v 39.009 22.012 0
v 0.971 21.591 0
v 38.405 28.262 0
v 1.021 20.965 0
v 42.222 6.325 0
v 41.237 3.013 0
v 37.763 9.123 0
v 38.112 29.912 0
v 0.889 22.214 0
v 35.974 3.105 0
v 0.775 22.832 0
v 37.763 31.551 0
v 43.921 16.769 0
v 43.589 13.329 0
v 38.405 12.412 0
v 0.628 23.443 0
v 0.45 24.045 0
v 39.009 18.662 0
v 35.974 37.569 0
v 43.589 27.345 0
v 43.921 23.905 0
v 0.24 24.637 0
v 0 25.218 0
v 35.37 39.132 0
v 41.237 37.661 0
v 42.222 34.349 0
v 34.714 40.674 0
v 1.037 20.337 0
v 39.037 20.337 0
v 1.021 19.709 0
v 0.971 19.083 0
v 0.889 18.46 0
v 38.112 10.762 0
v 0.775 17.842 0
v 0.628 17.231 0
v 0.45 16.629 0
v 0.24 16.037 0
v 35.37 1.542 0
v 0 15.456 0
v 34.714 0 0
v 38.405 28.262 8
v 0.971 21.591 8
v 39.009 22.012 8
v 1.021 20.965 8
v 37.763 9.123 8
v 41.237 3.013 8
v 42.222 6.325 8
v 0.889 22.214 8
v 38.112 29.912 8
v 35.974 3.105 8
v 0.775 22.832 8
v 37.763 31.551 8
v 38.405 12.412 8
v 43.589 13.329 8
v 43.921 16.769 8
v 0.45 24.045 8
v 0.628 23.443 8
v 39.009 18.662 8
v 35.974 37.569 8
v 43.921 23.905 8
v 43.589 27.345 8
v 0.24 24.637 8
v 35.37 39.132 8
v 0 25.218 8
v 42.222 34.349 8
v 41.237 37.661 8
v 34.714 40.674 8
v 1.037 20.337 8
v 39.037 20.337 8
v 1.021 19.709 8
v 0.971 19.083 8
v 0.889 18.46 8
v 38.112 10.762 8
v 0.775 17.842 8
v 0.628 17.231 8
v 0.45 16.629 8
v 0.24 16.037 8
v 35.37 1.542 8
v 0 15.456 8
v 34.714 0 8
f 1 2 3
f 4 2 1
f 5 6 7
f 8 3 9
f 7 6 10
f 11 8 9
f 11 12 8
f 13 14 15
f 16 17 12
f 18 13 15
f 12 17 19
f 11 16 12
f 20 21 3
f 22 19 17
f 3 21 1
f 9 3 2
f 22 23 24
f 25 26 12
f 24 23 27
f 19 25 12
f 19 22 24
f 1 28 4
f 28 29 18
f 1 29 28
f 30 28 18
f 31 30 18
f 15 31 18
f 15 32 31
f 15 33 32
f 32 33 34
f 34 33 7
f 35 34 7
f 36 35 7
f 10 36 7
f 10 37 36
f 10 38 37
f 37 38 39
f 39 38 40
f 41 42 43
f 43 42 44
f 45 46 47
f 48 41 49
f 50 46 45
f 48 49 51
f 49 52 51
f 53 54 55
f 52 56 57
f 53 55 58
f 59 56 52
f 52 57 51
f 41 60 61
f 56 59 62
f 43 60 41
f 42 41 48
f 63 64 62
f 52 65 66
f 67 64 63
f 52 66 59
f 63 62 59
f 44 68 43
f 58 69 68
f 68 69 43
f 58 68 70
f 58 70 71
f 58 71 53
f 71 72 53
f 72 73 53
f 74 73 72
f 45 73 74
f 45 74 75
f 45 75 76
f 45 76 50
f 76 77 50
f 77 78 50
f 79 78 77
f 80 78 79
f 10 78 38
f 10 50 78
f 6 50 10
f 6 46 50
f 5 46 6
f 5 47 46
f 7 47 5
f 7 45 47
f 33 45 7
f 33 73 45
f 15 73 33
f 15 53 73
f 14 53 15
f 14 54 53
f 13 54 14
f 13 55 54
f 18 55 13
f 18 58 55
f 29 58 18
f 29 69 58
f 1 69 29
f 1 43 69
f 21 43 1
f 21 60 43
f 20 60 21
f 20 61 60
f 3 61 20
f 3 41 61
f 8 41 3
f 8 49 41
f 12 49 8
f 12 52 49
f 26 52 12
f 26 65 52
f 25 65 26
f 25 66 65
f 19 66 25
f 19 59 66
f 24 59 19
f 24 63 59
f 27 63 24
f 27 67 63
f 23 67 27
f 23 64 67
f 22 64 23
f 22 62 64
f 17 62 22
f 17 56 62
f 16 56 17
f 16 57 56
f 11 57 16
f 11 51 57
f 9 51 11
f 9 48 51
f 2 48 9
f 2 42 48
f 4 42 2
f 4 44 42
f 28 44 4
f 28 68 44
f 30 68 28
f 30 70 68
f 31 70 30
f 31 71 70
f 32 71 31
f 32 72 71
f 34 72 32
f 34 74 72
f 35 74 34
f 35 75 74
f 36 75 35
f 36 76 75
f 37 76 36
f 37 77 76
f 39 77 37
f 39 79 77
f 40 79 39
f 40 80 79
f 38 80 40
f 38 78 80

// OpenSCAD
$fn = 32;

// ----------------------------------------------------------------------
// Gear sector: 4 teeth on 48 degrees
// ----------------------------------------------------------------------

// --- parameters (mm) ---
sector_angle = 48;        // sector angle, degrees
root_r = 50;              // root circle radius
tooth_h = 5;              // tooth height over the root circle
teeth = 4;                // number of teeth on the sector
hub_r = 12;               // hub bore radius
plate_t = 8;              // sector thickness, Z
arc_step = 3;             // sampling step of the root/hub arcs, degrees

tip_r = root_r + tooth_h;  // tip circle radius

profile = [[34.714, 0], [35.37, 1.542], [35.974, 3.105], [41.237, 3.013], [42.222, 6.325], [37.763, 9.123], [38.112, 10.762], [38.405, 12.412], [43.589, 13.329], [43.921, 16.769], [39.009, 18.662], [39.037, 20.337], [39.009, 22.012], [43.921, 23.905], [43.589, 27.345], [38.405, 28.262], [38.112, 29.912], [37.763, 31.551], [42.222, 34.349], [41.237, 37.661], [35.974, 37.569], [35.37, 39.132], [34.714, 40.674], [0, 25.218], [0.24, 24.637], [0.45, 24.045], [0.628, 23.443], [0.775, 22.832], [0.889, 22.214], [0.971, 21.591], [1.021, 20.965], [1.037, 20.337], [1.021, 19.709], [0.971, 19.083], [0.889, 18.46], [0.775, 17.842], [0.628, 17.231], [0.45, 16.629], [0.24, 16.037], [0, 15.456]];  // primary outline, 40 points, counter clockwise

// --- the one profile operation ---
linear_extrude(height = plate_t) polygon(points = profile);
